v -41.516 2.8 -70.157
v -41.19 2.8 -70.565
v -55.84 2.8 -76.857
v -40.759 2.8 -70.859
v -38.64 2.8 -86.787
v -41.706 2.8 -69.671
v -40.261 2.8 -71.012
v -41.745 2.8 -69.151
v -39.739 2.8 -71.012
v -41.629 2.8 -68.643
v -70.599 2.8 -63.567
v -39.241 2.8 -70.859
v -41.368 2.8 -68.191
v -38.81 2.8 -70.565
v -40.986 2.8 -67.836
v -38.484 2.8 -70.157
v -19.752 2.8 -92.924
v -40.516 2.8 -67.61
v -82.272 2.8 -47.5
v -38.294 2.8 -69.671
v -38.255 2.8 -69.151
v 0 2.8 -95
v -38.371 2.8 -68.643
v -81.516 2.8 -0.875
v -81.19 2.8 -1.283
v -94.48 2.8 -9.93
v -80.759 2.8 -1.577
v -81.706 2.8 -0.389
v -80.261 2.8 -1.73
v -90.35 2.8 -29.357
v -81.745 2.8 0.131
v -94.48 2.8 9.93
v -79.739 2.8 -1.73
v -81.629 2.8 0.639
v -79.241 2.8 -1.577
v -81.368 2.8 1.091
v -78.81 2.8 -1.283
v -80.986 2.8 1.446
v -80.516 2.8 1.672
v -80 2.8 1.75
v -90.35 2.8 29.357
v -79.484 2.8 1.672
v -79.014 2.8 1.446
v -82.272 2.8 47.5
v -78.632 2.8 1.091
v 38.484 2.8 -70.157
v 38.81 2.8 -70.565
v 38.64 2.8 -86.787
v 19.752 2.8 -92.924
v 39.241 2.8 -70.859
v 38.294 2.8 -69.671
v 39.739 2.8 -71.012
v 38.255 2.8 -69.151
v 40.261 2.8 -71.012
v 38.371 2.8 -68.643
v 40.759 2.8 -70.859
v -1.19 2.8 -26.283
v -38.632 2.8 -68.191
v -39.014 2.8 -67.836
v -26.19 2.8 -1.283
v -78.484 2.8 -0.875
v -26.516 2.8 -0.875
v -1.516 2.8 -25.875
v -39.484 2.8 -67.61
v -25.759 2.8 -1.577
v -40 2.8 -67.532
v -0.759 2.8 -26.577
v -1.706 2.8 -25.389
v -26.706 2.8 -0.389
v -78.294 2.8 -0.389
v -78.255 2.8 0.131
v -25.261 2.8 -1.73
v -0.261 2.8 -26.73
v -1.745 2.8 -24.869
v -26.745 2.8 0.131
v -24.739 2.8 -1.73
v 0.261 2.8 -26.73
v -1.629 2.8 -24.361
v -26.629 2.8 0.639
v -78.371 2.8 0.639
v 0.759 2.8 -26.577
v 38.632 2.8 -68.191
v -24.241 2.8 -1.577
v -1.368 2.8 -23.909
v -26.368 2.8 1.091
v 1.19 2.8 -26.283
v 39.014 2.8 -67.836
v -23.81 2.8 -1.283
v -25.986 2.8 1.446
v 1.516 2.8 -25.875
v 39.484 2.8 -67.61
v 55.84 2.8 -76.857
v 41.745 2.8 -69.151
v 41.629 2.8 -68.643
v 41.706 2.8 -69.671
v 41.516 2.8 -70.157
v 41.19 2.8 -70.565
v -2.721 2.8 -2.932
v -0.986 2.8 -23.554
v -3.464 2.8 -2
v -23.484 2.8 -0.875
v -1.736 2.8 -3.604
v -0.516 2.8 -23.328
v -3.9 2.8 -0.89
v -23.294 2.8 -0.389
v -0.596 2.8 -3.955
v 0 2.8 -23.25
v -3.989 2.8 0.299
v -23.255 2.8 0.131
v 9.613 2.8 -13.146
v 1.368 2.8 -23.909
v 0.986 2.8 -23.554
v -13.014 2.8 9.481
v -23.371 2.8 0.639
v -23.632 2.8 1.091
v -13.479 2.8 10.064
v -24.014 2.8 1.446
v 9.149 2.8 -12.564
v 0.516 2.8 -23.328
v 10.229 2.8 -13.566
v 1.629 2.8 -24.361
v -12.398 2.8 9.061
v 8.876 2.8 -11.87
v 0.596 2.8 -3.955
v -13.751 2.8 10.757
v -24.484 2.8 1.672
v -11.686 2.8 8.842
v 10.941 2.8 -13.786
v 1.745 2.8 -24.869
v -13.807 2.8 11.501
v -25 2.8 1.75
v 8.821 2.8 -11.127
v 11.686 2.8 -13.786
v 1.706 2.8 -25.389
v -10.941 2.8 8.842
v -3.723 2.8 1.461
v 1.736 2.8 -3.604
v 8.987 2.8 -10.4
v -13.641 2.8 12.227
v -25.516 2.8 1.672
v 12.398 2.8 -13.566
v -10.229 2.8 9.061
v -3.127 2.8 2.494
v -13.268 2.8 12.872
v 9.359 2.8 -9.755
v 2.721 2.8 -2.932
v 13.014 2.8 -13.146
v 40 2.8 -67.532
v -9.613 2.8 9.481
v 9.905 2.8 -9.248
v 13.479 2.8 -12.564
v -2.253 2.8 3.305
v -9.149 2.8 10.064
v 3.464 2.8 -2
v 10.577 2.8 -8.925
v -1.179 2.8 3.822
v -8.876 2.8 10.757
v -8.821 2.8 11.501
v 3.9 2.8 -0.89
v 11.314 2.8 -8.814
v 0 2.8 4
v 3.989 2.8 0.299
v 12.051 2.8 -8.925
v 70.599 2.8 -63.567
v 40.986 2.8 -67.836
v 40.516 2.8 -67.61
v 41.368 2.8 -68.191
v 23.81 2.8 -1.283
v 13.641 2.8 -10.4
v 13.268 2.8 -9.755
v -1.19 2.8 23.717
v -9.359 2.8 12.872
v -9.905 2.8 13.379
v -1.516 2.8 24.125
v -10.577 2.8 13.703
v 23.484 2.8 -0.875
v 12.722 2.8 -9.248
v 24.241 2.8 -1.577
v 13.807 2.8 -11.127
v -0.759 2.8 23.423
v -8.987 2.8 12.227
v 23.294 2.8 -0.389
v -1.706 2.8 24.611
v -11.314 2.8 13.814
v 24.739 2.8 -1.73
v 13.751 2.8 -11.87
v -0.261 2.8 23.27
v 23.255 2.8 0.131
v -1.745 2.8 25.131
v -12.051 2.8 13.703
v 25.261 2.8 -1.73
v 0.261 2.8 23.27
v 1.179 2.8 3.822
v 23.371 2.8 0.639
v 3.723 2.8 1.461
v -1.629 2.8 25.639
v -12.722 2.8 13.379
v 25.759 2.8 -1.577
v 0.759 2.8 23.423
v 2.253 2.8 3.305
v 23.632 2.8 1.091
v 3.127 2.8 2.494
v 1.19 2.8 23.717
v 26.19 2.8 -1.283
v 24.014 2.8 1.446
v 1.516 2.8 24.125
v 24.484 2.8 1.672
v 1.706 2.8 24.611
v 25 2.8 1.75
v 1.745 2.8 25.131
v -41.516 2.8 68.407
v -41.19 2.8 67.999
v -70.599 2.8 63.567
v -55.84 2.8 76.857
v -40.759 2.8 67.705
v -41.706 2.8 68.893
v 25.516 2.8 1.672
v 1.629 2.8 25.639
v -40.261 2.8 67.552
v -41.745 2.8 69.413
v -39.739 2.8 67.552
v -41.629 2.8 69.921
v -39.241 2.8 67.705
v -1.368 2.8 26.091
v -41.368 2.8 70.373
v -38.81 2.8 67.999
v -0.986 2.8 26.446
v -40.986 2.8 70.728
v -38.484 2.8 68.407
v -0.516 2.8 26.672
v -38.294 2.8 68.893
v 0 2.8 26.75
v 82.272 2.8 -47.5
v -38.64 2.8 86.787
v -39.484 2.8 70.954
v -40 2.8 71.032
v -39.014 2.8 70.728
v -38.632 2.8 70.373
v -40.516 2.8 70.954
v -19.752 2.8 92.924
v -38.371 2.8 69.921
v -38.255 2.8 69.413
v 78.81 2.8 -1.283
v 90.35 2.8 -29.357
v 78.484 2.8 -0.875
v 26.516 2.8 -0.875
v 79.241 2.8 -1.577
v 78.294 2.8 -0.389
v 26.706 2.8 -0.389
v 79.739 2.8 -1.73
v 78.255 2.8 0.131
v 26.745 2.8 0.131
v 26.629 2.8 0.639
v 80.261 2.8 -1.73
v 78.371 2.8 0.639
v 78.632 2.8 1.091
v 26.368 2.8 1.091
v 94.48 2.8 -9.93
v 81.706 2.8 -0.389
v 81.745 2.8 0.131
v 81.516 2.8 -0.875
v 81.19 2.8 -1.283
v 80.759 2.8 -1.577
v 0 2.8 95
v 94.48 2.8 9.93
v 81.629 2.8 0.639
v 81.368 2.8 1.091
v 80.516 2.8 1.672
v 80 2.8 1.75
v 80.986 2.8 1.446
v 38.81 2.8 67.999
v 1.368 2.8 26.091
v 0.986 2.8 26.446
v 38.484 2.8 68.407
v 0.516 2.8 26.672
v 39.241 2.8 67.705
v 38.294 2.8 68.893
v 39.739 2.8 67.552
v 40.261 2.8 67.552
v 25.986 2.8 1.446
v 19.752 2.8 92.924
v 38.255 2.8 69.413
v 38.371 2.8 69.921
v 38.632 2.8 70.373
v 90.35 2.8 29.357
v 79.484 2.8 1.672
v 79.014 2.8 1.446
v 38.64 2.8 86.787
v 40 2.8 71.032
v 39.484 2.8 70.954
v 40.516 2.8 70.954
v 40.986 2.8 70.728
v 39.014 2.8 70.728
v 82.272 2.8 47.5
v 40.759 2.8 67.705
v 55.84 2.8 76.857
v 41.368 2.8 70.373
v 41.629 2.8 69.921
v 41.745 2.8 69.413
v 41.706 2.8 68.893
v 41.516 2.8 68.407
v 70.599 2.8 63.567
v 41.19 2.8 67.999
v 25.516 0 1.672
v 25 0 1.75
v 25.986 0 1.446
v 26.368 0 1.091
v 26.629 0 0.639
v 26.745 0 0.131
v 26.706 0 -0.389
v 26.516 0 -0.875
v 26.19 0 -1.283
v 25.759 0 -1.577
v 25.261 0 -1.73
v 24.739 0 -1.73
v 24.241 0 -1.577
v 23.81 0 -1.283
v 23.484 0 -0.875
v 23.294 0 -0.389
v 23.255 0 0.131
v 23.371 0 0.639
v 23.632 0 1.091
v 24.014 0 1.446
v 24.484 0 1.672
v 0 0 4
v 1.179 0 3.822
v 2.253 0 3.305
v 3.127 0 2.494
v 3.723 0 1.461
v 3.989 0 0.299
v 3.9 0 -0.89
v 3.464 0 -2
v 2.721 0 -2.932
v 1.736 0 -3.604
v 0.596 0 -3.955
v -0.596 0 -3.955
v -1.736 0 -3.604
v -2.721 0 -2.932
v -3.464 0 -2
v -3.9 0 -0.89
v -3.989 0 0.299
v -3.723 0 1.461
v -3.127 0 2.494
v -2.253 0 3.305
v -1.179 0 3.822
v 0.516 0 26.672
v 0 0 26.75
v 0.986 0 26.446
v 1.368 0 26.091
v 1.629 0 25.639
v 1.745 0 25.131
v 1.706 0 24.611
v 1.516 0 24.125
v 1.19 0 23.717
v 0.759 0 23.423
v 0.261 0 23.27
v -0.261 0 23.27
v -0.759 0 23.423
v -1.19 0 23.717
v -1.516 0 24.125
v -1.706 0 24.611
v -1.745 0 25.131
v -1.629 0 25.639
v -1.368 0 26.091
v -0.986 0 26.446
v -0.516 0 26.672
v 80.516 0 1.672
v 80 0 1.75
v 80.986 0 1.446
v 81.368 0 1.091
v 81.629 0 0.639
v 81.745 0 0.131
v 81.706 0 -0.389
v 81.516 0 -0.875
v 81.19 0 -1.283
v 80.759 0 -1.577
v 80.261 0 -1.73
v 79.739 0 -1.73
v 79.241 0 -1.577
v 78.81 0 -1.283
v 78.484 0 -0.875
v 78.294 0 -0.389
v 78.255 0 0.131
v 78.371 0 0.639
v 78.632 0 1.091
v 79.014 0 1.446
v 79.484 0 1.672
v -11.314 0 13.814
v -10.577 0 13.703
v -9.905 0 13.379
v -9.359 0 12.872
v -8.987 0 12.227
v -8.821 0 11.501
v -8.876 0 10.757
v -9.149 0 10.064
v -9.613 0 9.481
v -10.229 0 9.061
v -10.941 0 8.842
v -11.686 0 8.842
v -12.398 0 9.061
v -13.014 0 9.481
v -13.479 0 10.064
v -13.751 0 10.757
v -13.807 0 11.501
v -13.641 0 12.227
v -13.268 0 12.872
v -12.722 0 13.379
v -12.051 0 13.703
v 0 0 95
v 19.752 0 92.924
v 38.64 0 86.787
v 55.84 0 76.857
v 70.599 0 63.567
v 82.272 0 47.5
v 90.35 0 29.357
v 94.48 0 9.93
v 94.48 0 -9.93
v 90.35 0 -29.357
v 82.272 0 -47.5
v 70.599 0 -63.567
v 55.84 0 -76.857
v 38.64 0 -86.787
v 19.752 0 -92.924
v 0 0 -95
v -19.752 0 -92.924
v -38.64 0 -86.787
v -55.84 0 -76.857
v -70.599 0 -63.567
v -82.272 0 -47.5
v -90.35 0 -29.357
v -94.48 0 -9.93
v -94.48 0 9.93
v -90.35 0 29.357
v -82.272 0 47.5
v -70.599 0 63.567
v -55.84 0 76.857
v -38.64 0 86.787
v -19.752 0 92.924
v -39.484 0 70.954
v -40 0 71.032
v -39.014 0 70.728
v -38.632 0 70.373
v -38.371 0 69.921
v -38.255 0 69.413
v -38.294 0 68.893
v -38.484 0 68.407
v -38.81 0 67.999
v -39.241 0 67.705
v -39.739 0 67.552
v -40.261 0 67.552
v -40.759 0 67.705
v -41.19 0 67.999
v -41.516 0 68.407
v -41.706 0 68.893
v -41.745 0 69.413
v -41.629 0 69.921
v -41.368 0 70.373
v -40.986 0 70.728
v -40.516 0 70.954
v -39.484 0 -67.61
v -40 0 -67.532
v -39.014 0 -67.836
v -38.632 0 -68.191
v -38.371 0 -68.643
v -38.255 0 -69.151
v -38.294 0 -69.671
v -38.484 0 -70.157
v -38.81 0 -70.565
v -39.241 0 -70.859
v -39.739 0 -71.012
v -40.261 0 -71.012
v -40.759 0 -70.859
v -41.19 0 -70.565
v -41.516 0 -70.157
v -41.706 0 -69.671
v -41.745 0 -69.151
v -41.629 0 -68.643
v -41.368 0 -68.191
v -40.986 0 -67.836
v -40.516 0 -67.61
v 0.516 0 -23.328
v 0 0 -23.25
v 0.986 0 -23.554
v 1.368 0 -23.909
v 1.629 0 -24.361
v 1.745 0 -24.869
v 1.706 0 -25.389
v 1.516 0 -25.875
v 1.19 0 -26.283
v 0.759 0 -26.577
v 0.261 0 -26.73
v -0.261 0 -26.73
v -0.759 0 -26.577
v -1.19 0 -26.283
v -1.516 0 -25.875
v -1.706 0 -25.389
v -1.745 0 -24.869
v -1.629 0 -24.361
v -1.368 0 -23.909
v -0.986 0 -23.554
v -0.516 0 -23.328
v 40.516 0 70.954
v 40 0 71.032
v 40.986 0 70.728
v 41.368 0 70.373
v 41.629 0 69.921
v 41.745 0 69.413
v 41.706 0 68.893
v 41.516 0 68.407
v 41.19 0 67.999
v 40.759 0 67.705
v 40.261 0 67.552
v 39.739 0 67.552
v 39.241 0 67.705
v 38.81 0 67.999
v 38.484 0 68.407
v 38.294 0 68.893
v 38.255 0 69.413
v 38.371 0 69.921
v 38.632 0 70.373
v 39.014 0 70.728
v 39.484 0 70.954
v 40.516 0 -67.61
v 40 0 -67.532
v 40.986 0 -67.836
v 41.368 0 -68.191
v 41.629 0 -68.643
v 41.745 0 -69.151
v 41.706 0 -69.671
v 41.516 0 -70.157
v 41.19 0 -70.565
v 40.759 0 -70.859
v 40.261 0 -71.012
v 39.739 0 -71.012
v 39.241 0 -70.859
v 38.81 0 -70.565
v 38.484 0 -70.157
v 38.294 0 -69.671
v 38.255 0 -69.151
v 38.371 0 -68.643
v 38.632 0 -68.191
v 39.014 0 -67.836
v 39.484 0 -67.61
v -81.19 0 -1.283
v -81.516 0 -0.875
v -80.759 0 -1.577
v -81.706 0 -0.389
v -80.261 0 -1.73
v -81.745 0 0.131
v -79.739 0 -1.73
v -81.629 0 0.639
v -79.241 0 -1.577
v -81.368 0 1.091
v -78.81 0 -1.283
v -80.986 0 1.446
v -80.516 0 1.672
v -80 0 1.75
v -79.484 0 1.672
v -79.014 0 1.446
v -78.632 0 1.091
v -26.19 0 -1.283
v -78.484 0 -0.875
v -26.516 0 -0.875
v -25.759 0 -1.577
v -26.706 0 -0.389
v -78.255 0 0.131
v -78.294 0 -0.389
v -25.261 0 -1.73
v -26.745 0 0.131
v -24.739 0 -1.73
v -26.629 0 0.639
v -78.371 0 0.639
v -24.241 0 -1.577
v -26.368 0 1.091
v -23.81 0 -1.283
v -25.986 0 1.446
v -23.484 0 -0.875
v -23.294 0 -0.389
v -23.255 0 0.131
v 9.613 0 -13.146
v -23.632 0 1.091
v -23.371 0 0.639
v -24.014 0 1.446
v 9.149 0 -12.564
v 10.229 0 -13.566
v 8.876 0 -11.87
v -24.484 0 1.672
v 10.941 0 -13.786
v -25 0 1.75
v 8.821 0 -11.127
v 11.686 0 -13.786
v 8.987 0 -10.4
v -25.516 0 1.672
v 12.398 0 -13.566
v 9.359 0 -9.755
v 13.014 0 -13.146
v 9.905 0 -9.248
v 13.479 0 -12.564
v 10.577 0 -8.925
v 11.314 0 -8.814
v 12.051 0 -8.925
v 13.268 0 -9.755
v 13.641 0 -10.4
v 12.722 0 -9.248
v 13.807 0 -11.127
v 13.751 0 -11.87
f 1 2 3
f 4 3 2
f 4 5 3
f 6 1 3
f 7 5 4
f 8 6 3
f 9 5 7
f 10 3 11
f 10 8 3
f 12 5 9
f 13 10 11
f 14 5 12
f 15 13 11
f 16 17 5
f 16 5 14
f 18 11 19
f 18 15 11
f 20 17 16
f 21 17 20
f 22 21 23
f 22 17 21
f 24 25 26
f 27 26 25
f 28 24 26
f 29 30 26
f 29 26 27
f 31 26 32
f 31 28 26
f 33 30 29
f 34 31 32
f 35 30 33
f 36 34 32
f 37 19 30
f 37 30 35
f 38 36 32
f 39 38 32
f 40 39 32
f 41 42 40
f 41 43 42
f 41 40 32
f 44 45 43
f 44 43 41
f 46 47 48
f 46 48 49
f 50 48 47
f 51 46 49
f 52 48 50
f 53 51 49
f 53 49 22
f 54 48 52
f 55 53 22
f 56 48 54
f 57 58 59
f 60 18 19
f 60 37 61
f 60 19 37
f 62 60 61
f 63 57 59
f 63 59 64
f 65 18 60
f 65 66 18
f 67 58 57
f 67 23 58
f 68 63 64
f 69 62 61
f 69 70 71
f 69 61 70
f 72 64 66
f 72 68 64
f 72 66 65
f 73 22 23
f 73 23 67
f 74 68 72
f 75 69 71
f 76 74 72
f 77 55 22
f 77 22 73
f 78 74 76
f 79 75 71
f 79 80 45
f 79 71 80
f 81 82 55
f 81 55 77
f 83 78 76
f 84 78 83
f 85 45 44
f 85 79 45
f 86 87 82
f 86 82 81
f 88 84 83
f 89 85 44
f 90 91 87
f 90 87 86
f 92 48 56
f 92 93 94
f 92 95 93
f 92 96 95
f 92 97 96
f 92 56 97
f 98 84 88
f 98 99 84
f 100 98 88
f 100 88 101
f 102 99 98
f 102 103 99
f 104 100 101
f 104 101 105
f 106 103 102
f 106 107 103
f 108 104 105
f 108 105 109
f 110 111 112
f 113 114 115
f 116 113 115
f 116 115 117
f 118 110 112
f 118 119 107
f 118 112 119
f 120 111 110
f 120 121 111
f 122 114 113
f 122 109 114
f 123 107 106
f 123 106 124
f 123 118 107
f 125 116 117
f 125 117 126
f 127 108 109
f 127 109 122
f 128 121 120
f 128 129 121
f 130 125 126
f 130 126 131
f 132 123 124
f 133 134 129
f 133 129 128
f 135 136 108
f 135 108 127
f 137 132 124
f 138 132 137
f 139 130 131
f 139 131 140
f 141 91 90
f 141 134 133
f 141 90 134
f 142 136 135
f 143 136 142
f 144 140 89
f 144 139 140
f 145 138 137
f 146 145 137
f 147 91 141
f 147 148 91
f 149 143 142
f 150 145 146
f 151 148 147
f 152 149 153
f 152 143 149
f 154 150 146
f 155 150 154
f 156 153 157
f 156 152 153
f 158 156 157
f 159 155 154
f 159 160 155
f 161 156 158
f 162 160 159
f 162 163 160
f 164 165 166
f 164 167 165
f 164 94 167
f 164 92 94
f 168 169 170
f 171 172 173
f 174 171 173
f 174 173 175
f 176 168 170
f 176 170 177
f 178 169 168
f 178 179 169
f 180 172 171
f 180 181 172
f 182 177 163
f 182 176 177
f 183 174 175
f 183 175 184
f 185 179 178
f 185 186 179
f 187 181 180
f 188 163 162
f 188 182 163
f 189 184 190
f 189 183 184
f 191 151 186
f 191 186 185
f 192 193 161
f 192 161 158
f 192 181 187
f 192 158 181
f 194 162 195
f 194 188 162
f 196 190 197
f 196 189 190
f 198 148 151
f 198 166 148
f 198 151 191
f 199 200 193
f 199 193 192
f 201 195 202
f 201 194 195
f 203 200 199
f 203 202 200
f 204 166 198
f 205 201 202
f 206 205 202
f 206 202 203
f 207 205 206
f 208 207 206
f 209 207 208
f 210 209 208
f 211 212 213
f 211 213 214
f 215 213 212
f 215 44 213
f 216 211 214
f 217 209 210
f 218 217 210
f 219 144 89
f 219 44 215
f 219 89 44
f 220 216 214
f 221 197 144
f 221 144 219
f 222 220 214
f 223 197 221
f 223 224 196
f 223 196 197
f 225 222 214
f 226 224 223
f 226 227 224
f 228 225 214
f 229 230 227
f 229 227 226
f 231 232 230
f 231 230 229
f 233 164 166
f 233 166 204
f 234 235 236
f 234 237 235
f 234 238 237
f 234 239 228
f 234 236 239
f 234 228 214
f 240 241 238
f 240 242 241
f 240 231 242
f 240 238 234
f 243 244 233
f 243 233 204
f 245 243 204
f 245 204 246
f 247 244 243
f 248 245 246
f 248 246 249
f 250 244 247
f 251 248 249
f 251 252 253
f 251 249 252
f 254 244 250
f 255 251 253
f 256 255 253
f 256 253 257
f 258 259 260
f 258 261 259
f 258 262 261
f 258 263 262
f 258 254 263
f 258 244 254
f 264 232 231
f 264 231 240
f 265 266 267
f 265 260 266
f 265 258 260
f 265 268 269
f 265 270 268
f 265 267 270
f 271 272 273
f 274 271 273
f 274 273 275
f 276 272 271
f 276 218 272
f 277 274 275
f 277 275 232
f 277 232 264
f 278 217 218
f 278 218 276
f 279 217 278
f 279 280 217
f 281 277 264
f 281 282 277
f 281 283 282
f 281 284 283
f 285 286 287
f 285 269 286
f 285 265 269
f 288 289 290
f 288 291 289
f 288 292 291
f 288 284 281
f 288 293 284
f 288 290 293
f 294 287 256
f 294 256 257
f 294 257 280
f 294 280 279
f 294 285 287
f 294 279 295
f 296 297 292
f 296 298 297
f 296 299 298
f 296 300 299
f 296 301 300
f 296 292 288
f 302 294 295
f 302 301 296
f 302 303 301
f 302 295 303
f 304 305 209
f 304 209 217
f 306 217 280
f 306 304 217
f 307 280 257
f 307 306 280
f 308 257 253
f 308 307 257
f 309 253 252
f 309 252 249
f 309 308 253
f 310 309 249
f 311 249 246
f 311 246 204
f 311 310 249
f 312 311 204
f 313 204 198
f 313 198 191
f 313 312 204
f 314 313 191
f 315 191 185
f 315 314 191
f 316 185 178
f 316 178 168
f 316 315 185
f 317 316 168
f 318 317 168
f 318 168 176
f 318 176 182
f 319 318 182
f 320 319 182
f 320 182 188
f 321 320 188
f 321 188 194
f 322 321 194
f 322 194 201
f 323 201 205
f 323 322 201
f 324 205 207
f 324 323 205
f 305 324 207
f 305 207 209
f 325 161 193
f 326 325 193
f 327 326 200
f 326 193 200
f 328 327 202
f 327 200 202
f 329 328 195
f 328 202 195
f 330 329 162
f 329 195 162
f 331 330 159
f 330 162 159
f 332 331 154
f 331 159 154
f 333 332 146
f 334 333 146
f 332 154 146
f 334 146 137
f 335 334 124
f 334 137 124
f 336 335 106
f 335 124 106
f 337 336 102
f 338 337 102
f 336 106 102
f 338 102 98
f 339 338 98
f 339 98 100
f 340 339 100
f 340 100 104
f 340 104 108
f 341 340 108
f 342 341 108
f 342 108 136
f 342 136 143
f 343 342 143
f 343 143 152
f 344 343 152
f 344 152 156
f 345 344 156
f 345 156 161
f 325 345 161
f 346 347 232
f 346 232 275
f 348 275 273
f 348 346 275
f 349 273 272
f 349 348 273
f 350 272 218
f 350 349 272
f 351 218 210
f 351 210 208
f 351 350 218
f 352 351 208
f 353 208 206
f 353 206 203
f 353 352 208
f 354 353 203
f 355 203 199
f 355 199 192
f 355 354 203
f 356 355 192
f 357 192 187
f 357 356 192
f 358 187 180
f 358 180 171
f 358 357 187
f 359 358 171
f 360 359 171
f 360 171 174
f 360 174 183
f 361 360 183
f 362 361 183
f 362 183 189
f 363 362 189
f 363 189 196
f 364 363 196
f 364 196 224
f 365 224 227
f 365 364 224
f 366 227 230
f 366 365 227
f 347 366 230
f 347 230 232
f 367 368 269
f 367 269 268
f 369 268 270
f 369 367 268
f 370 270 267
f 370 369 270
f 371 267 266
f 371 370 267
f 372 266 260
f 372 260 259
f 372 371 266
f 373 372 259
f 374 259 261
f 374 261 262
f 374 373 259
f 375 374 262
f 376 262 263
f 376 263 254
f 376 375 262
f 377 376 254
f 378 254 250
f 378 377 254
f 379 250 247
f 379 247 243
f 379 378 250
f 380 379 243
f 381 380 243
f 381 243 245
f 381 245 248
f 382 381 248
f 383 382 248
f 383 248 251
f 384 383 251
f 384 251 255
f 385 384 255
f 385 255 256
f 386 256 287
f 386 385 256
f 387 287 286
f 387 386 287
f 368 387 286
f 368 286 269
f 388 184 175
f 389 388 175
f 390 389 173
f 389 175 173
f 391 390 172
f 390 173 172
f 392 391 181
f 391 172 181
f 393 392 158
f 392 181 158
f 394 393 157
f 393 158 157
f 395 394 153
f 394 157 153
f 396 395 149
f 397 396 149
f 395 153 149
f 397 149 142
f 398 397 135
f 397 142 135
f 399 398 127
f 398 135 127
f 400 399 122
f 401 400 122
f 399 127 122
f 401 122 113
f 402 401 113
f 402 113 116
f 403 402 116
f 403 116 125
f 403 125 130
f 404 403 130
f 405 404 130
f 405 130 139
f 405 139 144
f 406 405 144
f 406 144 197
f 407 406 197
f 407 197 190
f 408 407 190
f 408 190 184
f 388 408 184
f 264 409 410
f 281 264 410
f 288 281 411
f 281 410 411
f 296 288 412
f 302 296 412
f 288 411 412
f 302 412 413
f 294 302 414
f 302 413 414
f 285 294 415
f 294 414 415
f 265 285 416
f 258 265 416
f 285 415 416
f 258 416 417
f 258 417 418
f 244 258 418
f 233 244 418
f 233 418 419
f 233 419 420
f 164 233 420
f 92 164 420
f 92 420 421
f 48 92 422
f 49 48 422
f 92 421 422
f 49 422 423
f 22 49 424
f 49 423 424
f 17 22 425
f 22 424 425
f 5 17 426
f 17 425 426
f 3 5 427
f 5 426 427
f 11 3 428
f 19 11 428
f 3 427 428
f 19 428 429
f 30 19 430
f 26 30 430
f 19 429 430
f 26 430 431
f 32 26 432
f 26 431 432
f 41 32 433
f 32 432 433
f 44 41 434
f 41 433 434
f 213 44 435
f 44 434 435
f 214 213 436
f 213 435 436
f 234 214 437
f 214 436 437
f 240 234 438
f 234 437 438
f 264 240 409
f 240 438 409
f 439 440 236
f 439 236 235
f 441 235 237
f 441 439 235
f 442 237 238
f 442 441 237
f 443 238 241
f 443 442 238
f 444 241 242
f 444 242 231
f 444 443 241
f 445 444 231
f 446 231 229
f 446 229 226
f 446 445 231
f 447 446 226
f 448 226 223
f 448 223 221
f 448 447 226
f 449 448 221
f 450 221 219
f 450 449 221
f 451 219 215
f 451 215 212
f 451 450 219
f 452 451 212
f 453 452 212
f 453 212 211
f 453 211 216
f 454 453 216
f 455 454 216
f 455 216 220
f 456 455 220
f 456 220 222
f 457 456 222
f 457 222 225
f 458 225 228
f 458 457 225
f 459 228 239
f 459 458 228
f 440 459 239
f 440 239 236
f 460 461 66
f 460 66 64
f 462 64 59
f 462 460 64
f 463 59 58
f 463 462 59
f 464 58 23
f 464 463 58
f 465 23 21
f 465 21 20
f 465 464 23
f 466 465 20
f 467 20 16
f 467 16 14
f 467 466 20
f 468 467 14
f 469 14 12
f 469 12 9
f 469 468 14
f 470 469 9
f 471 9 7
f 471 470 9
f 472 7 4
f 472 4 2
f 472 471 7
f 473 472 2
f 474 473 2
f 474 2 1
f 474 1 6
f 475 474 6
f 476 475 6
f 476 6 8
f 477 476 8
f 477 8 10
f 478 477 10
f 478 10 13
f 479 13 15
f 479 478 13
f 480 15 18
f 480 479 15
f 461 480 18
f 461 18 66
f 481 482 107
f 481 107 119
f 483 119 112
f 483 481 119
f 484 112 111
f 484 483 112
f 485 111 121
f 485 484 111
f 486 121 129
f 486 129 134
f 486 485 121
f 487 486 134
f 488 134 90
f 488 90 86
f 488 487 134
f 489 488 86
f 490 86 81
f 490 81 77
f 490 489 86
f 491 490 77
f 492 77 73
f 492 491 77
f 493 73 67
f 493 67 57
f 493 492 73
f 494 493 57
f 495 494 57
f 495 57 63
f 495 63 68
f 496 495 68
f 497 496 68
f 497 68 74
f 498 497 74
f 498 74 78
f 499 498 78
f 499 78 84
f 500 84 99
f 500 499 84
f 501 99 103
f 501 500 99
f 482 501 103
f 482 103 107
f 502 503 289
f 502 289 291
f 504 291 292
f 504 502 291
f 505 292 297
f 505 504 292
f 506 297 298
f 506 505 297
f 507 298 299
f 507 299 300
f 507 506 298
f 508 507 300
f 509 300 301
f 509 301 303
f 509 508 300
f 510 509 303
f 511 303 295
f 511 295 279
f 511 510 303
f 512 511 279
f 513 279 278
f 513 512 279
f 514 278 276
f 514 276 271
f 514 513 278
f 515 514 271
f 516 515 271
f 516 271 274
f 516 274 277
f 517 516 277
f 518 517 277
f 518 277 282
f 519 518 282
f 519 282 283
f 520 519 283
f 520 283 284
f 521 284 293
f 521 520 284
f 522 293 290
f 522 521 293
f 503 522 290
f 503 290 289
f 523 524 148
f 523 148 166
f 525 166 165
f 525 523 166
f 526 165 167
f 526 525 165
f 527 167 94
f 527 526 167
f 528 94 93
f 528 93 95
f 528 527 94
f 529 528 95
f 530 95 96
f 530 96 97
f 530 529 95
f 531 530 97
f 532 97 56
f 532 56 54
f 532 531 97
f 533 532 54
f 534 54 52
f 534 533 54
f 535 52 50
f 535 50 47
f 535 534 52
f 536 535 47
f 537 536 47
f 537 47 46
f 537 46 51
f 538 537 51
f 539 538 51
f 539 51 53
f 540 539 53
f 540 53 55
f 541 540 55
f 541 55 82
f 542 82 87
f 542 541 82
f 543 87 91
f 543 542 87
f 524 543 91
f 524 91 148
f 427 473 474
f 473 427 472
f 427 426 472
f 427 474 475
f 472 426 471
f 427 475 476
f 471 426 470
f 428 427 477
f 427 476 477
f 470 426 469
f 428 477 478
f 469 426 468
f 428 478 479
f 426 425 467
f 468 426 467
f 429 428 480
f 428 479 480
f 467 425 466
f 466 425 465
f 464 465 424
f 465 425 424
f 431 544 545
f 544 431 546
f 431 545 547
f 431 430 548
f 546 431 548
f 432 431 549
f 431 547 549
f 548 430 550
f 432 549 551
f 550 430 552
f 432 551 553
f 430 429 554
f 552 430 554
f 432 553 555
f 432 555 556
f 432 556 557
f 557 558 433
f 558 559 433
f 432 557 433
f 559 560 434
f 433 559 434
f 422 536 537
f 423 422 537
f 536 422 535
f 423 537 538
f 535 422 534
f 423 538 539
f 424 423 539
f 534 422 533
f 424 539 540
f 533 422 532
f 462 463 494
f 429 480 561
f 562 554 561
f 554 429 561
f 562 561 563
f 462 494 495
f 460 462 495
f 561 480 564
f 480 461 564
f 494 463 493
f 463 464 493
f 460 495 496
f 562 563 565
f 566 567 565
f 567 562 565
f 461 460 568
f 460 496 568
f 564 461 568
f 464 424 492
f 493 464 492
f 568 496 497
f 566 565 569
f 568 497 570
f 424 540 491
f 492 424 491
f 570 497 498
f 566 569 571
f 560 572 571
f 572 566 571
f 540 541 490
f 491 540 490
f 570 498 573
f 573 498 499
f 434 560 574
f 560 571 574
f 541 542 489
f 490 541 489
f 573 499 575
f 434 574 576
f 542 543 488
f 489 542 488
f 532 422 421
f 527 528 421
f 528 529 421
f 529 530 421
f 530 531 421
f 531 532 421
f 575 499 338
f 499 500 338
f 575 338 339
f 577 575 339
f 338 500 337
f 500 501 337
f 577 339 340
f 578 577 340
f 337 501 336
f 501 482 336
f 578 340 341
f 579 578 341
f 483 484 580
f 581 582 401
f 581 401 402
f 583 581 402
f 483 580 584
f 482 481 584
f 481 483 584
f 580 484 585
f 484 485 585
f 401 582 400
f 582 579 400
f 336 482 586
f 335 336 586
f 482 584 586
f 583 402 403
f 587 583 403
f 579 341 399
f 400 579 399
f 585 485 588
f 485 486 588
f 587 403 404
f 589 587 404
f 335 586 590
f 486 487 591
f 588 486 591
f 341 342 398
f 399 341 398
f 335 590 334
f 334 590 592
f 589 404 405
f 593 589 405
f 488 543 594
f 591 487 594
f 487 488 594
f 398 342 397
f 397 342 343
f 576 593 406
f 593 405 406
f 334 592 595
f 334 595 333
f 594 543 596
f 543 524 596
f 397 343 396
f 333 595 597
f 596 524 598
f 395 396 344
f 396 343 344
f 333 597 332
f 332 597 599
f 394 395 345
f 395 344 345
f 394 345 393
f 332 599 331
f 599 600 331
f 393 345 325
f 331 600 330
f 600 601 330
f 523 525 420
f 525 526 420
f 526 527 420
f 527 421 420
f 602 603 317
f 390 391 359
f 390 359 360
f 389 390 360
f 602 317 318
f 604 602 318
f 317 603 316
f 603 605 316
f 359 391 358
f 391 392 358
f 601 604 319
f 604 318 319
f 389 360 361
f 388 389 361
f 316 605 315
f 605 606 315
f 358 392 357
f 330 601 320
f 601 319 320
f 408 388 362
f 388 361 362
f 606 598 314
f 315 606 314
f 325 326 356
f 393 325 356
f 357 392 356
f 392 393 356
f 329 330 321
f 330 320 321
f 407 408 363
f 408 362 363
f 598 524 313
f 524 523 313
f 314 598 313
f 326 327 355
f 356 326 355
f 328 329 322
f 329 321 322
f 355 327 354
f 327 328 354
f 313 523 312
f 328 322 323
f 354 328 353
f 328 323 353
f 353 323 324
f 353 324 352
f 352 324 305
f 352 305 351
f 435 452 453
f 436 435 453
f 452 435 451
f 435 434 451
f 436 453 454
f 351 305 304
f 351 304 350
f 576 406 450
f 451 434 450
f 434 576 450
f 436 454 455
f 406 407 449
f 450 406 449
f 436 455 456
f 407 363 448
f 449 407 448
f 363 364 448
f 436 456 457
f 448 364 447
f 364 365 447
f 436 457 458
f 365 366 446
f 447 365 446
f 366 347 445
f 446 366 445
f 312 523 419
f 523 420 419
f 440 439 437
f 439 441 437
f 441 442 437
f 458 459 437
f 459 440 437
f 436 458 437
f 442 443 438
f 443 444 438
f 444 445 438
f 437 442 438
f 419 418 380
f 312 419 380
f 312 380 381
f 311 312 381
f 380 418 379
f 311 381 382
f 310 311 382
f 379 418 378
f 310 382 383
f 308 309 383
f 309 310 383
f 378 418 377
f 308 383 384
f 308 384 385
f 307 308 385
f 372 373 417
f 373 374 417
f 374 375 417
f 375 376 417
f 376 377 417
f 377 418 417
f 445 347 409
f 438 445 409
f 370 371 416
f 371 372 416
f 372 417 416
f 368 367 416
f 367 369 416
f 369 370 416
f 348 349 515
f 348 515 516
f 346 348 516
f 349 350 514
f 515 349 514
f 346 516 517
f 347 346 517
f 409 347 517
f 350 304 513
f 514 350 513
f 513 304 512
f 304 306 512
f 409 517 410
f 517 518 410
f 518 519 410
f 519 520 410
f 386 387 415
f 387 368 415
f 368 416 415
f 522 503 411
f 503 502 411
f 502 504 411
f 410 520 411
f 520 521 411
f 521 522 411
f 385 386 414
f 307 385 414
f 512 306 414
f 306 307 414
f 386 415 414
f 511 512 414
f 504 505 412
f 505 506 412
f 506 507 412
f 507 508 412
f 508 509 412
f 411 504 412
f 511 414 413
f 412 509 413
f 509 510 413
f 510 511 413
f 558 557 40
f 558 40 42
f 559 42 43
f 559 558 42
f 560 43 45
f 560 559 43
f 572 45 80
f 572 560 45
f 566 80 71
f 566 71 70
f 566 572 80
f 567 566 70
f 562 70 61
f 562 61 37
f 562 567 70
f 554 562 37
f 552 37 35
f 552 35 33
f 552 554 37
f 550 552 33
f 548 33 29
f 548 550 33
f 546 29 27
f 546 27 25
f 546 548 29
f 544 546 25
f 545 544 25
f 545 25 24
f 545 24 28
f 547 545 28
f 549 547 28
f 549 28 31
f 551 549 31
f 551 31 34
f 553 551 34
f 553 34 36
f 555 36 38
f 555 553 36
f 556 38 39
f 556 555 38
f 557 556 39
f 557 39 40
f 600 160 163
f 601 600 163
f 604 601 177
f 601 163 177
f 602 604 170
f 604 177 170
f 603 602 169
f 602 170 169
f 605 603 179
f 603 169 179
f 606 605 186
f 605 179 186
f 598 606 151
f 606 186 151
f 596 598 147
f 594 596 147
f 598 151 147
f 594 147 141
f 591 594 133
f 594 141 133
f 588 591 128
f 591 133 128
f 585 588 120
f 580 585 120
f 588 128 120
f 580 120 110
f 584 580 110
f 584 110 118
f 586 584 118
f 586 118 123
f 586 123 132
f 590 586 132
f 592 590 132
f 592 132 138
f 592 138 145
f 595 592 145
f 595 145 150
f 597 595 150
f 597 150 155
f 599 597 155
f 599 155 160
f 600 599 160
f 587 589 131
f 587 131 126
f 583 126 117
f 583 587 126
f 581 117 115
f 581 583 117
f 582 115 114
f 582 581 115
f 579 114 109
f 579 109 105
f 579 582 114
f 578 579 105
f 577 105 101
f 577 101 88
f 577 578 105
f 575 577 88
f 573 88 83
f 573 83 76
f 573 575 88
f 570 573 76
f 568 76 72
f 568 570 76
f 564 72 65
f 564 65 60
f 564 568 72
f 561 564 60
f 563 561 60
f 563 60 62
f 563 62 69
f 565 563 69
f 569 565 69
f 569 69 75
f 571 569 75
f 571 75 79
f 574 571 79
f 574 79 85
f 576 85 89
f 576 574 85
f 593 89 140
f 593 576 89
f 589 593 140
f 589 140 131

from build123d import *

# Parameters (mm, degrees)
SKETCH1_R           = 95
SKETCH1_R_2         = 1.75
BOSS_EXTRUDE1_DEPTH = 2.8
SKETCH2_R           = 4
SKETCH2_R_2         = 2.5
CUT_EXTRUDE1_DEPTH  = 10


with BuildPart() as part:
    # Sketch1 → Boss-Extrude1 (new body)
    with BuildSketch(Plane(origin=(0, 0, 0), x_dir=(1, 0, 0), z_dir=(0, 1, 0))):
        with Locations(Location((0, 0, 0), (0, 0, 270))):
            Circle(SKETCH1_R)
        with Locations(Location((80, 0, 0), (0, 0, 270))):
            Circle(SKETCH1_R_2, mode=Mode.SUBTRACT)
        with Locations(Location((40, -69.282032303, 0), (0, 0, 270))):
            Circle(SKETCH1_R_2, mode=Mode.SUBTRACT)
        with Locations(Location((-40, -69.282032303, 0), (0, 0, 270))):
            Circle(SKETCH1_R_2, mode=Mode.SUBTRACT)
        with Locations(Location((-80, 0, 0), (0, 0, 270))):
            Circle(SKETCH1_R_2, mode=Mode.SUBTRACT)
        with Locations(Location((-40, 69.282032303, 0), (0, 0, 270))):
            Circle(SKETCH1_R_2, mode=Mode.SUBTRACT)
        with Locations(Location((40, 69.282032303, 0), (0, 0, 270))):
            Circle(SKETCH1_R_2, mode=Mode.SUBTRACT)
        with Locations(Location((0, 25, 0), (0, 0, 270))):
            Circle(SKETCH1_R_2, mode=Mode.SUBTRACT)
        with Locations(Location((25, 0, 0), (0, 0, 270))):
            Circle(SKETCH1_R_2, mode=Mode.SUBTRACT)
        with Locations(Location((0, -25, 0), (0, 0, 270))):
            Circle(SKETCH1_R_2, mode=Mode.SUBTRACT)
        with Locations(Location((-25, 0, 0), (0, 0, 270))):
            Circle(SKETCH1_R_2, mode=Mode.SUBTRACT)
    extrude(amount=BOSS_EXTRUDE1_DEPTH)

    # Sketch2 → Cut-Extrude1 (cut)
    with BuildSketch(Plane(origin=(0, 2.8, 0), x_dir=(1, 0, 0), z_dir=(0, 1, 0))):
        with Locations(Location((0, 0, 0), (0, 0, 270))):
            Circle(SKETCH2_R)
        with Locations(Location((11.313708499, 11.313708499, 0), (0, 0, 270))):
            Circle(SKETCH2_R_2)
        with Locations(Location((-11.313708499, -11.313708499, 0), (0, 0, 270))):
            Circle(SKETCH2_R_2)
    extrude(amount=-CUT_EXTRUDE1_DEPTH, mode=Mode.SUBTRACT)


solid = part.part
